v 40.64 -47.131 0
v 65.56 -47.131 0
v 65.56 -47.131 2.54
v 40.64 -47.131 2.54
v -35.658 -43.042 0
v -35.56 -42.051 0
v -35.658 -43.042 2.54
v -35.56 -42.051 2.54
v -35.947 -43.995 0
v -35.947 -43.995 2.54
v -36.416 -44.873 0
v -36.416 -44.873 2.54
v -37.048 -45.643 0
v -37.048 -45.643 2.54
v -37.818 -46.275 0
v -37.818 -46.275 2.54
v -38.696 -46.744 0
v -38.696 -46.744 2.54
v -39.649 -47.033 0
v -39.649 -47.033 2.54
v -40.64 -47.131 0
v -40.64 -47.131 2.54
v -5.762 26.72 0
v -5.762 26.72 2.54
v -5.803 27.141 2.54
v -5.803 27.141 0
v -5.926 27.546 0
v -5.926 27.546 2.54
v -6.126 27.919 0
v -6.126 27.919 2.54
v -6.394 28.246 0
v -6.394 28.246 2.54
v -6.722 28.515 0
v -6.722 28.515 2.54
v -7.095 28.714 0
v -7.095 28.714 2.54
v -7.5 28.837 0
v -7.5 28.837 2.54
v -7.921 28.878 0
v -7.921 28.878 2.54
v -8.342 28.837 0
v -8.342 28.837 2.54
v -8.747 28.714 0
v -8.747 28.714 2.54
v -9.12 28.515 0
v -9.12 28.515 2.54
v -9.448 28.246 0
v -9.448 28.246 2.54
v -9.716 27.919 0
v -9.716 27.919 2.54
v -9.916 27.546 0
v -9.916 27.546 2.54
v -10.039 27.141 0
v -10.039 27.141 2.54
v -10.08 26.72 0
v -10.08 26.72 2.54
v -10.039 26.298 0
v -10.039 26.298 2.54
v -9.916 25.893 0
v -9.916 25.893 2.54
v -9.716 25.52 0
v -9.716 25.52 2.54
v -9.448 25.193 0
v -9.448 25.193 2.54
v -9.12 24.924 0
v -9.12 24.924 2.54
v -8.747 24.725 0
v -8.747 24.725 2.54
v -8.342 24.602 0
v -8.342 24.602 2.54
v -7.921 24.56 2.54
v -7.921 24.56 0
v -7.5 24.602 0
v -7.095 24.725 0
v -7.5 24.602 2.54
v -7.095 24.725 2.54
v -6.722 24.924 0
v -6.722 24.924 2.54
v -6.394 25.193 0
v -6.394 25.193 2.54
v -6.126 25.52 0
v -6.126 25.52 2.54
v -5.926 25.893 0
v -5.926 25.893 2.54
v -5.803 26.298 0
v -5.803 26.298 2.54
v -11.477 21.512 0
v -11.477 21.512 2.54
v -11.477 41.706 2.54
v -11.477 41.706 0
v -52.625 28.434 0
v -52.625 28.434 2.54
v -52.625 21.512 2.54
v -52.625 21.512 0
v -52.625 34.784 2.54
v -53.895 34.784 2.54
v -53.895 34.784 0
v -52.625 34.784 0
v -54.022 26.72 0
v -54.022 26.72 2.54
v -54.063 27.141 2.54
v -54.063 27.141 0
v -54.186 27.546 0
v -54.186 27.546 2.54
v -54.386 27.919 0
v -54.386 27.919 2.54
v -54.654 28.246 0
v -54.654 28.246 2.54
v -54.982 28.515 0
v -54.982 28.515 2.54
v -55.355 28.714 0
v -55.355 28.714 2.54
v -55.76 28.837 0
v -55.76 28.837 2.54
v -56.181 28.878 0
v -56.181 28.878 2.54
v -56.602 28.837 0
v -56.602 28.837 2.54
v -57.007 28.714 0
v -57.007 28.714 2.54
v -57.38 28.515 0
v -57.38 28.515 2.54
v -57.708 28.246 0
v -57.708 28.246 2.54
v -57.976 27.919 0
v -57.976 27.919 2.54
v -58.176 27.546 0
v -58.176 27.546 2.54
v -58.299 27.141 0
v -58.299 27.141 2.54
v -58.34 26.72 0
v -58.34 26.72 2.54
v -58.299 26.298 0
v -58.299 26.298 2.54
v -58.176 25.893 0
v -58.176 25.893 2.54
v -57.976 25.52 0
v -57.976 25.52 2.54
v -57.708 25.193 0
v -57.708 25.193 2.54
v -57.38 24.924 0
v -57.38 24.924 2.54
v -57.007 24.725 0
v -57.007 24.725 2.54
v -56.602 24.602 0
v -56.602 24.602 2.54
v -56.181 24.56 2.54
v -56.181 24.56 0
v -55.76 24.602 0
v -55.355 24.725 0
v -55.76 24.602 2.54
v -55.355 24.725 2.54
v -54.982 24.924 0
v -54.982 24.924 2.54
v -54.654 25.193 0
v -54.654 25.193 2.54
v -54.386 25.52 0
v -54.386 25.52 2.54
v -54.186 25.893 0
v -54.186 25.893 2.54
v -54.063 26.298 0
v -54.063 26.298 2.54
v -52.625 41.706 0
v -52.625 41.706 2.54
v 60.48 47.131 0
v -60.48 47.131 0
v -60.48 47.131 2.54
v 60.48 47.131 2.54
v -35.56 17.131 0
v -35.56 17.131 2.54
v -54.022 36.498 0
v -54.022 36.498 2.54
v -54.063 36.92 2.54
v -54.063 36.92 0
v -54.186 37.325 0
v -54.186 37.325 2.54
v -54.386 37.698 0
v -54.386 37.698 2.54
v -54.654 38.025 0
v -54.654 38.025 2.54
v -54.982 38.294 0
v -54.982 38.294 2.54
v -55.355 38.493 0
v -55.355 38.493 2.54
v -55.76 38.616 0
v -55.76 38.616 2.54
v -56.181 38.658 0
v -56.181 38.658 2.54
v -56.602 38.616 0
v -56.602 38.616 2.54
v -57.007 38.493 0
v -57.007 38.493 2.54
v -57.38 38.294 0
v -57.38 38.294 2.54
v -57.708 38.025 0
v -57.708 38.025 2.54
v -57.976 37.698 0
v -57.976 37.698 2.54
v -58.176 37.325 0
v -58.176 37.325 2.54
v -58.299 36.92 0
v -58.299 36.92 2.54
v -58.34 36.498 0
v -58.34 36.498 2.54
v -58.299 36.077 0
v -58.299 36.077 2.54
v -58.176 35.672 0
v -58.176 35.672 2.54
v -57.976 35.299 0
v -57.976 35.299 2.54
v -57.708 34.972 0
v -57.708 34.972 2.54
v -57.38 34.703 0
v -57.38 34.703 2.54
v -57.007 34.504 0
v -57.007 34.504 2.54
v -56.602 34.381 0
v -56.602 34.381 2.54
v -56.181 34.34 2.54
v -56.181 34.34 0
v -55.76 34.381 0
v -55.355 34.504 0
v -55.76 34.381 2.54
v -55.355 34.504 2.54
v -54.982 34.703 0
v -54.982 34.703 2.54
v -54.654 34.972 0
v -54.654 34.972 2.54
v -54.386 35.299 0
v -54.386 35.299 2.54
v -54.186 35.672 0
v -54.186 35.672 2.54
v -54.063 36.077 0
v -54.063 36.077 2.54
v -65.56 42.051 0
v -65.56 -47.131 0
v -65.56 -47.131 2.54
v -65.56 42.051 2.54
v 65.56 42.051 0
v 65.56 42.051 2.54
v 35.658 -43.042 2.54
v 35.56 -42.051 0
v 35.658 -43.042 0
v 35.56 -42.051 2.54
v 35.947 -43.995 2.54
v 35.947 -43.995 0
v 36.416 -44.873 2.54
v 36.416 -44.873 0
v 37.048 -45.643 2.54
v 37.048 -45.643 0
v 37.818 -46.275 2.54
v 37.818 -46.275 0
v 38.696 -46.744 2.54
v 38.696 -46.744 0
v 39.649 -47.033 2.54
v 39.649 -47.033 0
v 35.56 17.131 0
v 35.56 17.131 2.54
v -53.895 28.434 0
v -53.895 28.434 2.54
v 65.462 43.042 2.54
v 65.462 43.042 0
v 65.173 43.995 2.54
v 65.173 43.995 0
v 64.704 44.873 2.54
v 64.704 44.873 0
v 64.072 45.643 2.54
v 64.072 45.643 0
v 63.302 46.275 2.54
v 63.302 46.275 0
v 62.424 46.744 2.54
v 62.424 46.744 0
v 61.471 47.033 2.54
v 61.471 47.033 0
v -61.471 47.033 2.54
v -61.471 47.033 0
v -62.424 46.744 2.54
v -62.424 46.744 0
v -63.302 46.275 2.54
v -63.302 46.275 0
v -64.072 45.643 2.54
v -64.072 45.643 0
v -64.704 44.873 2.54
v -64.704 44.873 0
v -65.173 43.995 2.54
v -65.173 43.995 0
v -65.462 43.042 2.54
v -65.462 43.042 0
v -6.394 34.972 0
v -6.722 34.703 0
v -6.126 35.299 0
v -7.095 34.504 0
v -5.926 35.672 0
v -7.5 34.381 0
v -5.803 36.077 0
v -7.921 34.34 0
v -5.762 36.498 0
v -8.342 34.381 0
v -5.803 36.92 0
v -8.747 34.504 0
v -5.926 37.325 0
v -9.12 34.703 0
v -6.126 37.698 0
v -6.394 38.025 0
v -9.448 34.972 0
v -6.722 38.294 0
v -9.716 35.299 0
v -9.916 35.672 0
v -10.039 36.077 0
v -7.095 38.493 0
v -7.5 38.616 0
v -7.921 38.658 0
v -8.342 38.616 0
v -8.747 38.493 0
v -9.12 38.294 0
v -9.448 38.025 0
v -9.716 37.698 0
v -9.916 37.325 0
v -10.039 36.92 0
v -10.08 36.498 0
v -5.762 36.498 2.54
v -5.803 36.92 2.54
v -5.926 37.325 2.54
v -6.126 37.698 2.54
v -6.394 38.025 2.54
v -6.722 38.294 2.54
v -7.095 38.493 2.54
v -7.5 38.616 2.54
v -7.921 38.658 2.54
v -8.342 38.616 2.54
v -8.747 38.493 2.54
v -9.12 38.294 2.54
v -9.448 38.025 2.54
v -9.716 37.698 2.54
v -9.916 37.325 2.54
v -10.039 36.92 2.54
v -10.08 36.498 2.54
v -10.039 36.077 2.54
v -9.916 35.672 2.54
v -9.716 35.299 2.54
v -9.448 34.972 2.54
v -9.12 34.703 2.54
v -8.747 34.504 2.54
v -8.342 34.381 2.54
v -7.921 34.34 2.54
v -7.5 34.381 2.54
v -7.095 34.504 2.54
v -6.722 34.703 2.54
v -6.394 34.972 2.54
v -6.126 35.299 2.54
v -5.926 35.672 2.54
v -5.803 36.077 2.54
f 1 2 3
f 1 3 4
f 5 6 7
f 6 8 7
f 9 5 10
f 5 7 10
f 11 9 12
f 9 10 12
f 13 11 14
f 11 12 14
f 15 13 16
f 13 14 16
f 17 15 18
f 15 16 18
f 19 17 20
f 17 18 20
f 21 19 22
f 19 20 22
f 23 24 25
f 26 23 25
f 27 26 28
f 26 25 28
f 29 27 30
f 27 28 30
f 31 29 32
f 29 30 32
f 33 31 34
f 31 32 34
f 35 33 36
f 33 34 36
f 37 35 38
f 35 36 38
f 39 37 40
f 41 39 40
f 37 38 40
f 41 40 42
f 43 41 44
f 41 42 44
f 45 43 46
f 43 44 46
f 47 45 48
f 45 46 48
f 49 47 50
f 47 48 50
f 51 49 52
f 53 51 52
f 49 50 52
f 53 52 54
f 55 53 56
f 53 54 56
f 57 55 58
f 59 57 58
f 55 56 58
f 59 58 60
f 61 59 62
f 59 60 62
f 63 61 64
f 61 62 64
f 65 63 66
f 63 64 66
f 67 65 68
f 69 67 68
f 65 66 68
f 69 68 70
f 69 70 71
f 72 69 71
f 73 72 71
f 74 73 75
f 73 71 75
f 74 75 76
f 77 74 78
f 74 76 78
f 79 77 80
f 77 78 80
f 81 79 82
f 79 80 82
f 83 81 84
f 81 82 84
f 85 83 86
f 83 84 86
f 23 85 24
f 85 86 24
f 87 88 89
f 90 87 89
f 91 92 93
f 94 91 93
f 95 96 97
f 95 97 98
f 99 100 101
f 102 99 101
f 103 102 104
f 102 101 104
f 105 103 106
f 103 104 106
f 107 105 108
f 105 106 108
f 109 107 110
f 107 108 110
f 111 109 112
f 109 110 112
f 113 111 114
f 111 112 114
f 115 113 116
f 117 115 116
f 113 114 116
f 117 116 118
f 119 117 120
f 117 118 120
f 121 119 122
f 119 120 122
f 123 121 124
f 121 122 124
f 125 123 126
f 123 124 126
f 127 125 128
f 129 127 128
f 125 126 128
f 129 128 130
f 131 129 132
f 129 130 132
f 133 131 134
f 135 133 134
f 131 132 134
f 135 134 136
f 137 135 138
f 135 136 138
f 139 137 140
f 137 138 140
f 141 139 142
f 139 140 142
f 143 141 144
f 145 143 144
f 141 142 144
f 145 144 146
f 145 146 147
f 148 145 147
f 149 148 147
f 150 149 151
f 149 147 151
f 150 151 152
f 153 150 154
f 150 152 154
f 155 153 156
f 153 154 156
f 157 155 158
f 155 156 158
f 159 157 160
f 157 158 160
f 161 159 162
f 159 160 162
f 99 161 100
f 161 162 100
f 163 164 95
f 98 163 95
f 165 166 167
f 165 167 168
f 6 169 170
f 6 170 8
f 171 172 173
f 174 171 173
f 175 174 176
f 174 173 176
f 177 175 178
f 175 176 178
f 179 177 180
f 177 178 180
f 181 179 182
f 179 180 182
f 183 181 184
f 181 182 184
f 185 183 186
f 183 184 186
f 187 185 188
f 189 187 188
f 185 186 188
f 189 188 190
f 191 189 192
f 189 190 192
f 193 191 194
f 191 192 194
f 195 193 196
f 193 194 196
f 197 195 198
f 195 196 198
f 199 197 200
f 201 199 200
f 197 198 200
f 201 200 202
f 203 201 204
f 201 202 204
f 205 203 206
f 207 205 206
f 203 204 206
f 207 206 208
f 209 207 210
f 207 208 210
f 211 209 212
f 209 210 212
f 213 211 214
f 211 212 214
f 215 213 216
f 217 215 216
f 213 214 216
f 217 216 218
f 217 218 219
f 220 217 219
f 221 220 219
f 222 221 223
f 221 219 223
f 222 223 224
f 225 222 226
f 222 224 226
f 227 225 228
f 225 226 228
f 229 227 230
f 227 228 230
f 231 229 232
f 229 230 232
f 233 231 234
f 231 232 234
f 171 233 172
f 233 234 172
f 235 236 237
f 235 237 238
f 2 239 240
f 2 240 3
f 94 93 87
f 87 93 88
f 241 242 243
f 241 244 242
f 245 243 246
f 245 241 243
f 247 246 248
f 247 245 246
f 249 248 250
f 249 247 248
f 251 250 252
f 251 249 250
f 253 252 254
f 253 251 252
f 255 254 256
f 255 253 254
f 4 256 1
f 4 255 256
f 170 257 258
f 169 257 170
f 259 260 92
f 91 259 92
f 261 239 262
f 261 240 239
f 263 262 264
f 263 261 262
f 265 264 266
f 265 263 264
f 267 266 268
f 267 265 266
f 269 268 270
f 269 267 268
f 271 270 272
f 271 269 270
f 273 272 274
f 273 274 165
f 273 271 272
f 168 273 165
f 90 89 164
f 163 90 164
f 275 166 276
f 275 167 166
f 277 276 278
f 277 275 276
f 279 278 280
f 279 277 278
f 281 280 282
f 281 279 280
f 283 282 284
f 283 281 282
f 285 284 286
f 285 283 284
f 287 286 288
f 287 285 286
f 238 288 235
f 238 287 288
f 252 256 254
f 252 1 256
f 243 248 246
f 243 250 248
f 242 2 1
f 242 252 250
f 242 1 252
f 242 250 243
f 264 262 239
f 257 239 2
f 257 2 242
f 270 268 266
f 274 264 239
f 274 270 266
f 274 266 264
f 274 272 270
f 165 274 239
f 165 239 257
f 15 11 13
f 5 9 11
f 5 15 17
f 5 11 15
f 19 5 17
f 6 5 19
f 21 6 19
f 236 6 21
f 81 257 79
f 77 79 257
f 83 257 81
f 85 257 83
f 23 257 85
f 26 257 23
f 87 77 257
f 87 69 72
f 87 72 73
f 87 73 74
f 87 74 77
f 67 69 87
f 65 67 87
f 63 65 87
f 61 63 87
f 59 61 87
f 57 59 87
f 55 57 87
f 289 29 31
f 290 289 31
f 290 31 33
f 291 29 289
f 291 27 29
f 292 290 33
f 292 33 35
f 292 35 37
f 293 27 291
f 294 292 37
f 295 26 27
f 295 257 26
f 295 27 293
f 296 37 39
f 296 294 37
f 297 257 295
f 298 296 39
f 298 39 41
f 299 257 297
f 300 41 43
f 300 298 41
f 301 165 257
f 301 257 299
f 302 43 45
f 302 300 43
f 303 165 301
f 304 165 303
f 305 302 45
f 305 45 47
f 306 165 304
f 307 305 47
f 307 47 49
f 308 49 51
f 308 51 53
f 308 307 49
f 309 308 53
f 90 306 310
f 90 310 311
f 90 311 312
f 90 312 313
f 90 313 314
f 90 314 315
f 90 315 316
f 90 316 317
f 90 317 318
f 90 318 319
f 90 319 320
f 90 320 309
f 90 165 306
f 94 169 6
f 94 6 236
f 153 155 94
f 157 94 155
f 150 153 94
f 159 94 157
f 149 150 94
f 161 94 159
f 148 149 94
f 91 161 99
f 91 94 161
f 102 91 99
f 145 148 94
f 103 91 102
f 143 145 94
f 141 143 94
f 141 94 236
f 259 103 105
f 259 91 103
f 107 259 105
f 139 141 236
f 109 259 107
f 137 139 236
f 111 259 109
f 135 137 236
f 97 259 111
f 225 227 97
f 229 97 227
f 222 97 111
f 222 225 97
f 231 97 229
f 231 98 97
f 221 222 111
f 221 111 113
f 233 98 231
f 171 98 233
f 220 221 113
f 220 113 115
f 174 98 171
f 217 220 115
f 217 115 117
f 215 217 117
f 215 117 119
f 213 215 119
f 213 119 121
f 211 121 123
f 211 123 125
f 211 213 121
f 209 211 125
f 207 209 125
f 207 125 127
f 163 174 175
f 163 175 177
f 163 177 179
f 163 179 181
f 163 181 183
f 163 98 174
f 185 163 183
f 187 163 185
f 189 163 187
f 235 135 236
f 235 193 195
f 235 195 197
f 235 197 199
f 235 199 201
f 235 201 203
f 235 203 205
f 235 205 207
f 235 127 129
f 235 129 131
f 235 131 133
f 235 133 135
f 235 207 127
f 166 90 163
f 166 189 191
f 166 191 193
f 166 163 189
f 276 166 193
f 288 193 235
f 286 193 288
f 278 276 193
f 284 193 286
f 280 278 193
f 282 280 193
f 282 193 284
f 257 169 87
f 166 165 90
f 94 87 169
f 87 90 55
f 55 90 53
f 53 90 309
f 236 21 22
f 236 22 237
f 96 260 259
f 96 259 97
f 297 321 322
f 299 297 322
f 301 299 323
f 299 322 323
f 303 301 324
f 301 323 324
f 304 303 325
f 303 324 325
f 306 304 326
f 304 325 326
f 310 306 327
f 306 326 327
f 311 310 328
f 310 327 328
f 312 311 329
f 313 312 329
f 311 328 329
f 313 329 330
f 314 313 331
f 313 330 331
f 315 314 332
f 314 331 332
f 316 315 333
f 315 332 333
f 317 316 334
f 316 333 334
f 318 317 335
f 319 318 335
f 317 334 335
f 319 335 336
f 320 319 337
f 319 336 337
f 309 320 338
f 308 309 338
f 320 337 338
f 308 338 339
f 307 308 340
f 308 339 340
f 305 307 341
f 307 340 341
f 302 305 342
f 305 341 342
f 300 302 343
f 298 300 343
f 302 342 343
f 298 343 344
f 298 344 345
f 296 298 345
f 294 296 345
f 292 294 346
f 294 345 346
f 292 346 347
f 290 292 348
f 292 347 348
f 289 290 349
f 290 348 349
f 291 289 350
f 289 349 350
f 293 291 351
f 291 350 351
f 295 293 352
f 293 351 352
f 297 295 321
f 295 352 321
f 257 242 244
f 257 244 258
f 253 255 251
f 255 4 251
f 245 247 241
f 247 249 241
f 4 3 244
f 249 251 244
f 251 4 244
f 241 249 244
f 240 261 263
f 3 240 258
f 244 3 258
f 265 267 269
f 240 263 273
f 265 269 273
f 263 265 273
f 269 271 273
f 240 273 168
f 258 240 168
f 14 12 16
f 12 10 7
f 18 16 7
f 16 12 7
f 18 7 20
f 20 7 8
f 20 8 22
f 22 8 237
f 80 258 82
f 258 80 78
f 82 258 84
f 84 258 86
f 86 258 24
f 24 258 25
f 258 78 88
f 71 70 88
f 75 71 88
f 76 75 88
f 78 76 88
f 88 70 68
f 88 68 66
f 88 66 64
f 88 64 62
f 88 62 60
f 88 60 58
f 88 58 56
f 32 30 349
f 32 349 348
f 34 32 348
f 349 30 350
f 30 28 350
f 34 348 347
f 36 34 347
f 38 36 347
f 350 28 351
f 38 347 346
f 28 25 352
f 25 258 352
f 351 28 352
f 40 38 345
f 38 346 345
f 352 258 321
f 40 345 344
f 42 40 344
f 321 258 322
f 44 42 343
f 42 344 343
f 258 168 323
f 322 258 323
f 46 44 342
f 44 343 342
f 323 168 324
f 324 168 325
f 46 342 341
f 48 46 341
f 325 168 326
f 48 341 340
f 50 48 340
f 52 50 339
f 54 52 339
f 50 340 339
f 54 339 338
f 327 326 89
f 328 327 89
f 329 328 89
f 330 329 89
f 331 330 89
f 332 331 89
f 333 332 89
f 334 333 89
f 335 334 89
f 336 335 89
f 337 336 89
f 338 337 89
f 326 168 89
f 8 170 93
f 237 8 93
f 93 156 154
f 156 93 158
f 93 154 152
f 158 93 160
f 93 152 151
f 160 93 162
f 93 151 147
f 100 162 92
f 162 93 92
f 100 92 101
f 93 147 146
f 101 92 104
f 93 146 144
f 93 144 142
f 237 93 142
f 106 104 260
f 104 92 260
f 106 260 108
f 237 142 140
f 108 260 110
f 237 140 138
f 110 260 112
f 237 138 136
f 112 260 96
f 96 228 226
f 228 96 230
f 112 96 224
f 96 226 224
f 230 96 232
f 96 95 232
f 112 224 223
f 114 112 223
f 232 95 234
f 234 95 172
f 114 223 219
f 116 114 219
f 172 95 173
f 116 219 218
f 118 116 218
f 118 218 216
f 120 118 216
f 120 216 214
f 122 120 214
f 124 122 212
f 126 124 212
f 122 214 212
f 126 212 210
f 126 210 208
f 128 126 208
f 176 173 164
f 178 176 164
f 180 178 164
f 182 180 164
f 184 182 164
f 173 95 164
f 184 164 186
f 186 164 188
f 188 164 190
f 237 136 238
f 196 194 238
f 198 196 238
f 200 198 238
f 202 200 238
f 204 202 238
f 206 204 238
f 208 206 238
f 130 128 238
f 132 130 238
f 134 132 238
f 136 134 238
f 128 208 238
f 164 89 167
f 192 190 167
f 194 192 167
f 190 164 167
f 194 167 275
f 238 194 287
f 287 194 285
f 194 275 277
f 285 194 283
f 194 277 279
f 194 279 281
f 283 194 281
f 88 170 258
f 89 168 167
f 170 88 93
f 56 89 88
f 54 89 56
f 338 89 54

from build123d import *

# Parameters (mm, degrees)
BOSS_EXTRUDE1_DEPTH = 2.54
SKETCH2_R           = 2.159
CUT_EXTRUDE1_DEPTH  = 2.54
FILLET1_R           = 5.08
SKETCH3_W           = 2.54
SKETCH3_H           = 6.35
CUT_EXTRUDE4_DEPTH  = 3.54


with BuildPart() as part:
    # Sketch1 → Boss-Extrude1 (new body)
    with BuildSketch(Plane.XY):
        Polygon((35.56, -47.131), (35.56, 17.131), (-35.56, 17.131), (-35.56, -47.131), (-65.56, -47.131), (-65.56, 47.131), (65.56, 47.131), (65.56, -47.131), align=None)
    extrude(amount=BOSS_EXTRUDE1_DEPTH)

    # Sketch2 → Cut-Extrude1 (cut)
    with BuildSketch(Plane.XY.offset(2.54)):
        with Locations((-56.181, 36.4985)):
            Circle(SKETCH2_R)
        with Locations((-56.181, 26.7195)):
            Circle(SKETCH2_R)
        with Locations((-7.921, 36.4985)):
            Circle(SKETCH2_R)
        with Locations((-7.921, 26.7195)):
            Circle(SKETCH2_R)
        Polygon((-11.477, 41.7055), (-52.625, 41.7055), (-52.625, 21.5125), (-11.477, 21.5125), (-11.477, 31.609), align=None)
    extrude(amount=-CUT_EXTRUDE1_DEPTH, mode=Mode.SUBTRACT)

    # Fillet1
    fillet1_edges = [part.edges().sort_by_distance(p)[0] for p in [
        (-65.56, 47.131, 1.27),
        (65.56, 47.131, 1.27),
        (35.56, -47.131, 1.27),
        (-35.56, -47.131, 1.27),
    ]]
    fillet(fillet1_edges, radius=FILLET1_R)

    # Sketch3 → Cut-Extrude4 (cut, through all)
    with BuildSketch(Plane.XY.offset(2.54)):
        with Locations((-52.625, 31.609)):
            Rectangle(SKETCH3_W, SKETCH3_H)
    extrude(amount=-CUT_EXTRUDE4_DEPTH, mode=Mode.SUBTRACT)


solid = part.part
